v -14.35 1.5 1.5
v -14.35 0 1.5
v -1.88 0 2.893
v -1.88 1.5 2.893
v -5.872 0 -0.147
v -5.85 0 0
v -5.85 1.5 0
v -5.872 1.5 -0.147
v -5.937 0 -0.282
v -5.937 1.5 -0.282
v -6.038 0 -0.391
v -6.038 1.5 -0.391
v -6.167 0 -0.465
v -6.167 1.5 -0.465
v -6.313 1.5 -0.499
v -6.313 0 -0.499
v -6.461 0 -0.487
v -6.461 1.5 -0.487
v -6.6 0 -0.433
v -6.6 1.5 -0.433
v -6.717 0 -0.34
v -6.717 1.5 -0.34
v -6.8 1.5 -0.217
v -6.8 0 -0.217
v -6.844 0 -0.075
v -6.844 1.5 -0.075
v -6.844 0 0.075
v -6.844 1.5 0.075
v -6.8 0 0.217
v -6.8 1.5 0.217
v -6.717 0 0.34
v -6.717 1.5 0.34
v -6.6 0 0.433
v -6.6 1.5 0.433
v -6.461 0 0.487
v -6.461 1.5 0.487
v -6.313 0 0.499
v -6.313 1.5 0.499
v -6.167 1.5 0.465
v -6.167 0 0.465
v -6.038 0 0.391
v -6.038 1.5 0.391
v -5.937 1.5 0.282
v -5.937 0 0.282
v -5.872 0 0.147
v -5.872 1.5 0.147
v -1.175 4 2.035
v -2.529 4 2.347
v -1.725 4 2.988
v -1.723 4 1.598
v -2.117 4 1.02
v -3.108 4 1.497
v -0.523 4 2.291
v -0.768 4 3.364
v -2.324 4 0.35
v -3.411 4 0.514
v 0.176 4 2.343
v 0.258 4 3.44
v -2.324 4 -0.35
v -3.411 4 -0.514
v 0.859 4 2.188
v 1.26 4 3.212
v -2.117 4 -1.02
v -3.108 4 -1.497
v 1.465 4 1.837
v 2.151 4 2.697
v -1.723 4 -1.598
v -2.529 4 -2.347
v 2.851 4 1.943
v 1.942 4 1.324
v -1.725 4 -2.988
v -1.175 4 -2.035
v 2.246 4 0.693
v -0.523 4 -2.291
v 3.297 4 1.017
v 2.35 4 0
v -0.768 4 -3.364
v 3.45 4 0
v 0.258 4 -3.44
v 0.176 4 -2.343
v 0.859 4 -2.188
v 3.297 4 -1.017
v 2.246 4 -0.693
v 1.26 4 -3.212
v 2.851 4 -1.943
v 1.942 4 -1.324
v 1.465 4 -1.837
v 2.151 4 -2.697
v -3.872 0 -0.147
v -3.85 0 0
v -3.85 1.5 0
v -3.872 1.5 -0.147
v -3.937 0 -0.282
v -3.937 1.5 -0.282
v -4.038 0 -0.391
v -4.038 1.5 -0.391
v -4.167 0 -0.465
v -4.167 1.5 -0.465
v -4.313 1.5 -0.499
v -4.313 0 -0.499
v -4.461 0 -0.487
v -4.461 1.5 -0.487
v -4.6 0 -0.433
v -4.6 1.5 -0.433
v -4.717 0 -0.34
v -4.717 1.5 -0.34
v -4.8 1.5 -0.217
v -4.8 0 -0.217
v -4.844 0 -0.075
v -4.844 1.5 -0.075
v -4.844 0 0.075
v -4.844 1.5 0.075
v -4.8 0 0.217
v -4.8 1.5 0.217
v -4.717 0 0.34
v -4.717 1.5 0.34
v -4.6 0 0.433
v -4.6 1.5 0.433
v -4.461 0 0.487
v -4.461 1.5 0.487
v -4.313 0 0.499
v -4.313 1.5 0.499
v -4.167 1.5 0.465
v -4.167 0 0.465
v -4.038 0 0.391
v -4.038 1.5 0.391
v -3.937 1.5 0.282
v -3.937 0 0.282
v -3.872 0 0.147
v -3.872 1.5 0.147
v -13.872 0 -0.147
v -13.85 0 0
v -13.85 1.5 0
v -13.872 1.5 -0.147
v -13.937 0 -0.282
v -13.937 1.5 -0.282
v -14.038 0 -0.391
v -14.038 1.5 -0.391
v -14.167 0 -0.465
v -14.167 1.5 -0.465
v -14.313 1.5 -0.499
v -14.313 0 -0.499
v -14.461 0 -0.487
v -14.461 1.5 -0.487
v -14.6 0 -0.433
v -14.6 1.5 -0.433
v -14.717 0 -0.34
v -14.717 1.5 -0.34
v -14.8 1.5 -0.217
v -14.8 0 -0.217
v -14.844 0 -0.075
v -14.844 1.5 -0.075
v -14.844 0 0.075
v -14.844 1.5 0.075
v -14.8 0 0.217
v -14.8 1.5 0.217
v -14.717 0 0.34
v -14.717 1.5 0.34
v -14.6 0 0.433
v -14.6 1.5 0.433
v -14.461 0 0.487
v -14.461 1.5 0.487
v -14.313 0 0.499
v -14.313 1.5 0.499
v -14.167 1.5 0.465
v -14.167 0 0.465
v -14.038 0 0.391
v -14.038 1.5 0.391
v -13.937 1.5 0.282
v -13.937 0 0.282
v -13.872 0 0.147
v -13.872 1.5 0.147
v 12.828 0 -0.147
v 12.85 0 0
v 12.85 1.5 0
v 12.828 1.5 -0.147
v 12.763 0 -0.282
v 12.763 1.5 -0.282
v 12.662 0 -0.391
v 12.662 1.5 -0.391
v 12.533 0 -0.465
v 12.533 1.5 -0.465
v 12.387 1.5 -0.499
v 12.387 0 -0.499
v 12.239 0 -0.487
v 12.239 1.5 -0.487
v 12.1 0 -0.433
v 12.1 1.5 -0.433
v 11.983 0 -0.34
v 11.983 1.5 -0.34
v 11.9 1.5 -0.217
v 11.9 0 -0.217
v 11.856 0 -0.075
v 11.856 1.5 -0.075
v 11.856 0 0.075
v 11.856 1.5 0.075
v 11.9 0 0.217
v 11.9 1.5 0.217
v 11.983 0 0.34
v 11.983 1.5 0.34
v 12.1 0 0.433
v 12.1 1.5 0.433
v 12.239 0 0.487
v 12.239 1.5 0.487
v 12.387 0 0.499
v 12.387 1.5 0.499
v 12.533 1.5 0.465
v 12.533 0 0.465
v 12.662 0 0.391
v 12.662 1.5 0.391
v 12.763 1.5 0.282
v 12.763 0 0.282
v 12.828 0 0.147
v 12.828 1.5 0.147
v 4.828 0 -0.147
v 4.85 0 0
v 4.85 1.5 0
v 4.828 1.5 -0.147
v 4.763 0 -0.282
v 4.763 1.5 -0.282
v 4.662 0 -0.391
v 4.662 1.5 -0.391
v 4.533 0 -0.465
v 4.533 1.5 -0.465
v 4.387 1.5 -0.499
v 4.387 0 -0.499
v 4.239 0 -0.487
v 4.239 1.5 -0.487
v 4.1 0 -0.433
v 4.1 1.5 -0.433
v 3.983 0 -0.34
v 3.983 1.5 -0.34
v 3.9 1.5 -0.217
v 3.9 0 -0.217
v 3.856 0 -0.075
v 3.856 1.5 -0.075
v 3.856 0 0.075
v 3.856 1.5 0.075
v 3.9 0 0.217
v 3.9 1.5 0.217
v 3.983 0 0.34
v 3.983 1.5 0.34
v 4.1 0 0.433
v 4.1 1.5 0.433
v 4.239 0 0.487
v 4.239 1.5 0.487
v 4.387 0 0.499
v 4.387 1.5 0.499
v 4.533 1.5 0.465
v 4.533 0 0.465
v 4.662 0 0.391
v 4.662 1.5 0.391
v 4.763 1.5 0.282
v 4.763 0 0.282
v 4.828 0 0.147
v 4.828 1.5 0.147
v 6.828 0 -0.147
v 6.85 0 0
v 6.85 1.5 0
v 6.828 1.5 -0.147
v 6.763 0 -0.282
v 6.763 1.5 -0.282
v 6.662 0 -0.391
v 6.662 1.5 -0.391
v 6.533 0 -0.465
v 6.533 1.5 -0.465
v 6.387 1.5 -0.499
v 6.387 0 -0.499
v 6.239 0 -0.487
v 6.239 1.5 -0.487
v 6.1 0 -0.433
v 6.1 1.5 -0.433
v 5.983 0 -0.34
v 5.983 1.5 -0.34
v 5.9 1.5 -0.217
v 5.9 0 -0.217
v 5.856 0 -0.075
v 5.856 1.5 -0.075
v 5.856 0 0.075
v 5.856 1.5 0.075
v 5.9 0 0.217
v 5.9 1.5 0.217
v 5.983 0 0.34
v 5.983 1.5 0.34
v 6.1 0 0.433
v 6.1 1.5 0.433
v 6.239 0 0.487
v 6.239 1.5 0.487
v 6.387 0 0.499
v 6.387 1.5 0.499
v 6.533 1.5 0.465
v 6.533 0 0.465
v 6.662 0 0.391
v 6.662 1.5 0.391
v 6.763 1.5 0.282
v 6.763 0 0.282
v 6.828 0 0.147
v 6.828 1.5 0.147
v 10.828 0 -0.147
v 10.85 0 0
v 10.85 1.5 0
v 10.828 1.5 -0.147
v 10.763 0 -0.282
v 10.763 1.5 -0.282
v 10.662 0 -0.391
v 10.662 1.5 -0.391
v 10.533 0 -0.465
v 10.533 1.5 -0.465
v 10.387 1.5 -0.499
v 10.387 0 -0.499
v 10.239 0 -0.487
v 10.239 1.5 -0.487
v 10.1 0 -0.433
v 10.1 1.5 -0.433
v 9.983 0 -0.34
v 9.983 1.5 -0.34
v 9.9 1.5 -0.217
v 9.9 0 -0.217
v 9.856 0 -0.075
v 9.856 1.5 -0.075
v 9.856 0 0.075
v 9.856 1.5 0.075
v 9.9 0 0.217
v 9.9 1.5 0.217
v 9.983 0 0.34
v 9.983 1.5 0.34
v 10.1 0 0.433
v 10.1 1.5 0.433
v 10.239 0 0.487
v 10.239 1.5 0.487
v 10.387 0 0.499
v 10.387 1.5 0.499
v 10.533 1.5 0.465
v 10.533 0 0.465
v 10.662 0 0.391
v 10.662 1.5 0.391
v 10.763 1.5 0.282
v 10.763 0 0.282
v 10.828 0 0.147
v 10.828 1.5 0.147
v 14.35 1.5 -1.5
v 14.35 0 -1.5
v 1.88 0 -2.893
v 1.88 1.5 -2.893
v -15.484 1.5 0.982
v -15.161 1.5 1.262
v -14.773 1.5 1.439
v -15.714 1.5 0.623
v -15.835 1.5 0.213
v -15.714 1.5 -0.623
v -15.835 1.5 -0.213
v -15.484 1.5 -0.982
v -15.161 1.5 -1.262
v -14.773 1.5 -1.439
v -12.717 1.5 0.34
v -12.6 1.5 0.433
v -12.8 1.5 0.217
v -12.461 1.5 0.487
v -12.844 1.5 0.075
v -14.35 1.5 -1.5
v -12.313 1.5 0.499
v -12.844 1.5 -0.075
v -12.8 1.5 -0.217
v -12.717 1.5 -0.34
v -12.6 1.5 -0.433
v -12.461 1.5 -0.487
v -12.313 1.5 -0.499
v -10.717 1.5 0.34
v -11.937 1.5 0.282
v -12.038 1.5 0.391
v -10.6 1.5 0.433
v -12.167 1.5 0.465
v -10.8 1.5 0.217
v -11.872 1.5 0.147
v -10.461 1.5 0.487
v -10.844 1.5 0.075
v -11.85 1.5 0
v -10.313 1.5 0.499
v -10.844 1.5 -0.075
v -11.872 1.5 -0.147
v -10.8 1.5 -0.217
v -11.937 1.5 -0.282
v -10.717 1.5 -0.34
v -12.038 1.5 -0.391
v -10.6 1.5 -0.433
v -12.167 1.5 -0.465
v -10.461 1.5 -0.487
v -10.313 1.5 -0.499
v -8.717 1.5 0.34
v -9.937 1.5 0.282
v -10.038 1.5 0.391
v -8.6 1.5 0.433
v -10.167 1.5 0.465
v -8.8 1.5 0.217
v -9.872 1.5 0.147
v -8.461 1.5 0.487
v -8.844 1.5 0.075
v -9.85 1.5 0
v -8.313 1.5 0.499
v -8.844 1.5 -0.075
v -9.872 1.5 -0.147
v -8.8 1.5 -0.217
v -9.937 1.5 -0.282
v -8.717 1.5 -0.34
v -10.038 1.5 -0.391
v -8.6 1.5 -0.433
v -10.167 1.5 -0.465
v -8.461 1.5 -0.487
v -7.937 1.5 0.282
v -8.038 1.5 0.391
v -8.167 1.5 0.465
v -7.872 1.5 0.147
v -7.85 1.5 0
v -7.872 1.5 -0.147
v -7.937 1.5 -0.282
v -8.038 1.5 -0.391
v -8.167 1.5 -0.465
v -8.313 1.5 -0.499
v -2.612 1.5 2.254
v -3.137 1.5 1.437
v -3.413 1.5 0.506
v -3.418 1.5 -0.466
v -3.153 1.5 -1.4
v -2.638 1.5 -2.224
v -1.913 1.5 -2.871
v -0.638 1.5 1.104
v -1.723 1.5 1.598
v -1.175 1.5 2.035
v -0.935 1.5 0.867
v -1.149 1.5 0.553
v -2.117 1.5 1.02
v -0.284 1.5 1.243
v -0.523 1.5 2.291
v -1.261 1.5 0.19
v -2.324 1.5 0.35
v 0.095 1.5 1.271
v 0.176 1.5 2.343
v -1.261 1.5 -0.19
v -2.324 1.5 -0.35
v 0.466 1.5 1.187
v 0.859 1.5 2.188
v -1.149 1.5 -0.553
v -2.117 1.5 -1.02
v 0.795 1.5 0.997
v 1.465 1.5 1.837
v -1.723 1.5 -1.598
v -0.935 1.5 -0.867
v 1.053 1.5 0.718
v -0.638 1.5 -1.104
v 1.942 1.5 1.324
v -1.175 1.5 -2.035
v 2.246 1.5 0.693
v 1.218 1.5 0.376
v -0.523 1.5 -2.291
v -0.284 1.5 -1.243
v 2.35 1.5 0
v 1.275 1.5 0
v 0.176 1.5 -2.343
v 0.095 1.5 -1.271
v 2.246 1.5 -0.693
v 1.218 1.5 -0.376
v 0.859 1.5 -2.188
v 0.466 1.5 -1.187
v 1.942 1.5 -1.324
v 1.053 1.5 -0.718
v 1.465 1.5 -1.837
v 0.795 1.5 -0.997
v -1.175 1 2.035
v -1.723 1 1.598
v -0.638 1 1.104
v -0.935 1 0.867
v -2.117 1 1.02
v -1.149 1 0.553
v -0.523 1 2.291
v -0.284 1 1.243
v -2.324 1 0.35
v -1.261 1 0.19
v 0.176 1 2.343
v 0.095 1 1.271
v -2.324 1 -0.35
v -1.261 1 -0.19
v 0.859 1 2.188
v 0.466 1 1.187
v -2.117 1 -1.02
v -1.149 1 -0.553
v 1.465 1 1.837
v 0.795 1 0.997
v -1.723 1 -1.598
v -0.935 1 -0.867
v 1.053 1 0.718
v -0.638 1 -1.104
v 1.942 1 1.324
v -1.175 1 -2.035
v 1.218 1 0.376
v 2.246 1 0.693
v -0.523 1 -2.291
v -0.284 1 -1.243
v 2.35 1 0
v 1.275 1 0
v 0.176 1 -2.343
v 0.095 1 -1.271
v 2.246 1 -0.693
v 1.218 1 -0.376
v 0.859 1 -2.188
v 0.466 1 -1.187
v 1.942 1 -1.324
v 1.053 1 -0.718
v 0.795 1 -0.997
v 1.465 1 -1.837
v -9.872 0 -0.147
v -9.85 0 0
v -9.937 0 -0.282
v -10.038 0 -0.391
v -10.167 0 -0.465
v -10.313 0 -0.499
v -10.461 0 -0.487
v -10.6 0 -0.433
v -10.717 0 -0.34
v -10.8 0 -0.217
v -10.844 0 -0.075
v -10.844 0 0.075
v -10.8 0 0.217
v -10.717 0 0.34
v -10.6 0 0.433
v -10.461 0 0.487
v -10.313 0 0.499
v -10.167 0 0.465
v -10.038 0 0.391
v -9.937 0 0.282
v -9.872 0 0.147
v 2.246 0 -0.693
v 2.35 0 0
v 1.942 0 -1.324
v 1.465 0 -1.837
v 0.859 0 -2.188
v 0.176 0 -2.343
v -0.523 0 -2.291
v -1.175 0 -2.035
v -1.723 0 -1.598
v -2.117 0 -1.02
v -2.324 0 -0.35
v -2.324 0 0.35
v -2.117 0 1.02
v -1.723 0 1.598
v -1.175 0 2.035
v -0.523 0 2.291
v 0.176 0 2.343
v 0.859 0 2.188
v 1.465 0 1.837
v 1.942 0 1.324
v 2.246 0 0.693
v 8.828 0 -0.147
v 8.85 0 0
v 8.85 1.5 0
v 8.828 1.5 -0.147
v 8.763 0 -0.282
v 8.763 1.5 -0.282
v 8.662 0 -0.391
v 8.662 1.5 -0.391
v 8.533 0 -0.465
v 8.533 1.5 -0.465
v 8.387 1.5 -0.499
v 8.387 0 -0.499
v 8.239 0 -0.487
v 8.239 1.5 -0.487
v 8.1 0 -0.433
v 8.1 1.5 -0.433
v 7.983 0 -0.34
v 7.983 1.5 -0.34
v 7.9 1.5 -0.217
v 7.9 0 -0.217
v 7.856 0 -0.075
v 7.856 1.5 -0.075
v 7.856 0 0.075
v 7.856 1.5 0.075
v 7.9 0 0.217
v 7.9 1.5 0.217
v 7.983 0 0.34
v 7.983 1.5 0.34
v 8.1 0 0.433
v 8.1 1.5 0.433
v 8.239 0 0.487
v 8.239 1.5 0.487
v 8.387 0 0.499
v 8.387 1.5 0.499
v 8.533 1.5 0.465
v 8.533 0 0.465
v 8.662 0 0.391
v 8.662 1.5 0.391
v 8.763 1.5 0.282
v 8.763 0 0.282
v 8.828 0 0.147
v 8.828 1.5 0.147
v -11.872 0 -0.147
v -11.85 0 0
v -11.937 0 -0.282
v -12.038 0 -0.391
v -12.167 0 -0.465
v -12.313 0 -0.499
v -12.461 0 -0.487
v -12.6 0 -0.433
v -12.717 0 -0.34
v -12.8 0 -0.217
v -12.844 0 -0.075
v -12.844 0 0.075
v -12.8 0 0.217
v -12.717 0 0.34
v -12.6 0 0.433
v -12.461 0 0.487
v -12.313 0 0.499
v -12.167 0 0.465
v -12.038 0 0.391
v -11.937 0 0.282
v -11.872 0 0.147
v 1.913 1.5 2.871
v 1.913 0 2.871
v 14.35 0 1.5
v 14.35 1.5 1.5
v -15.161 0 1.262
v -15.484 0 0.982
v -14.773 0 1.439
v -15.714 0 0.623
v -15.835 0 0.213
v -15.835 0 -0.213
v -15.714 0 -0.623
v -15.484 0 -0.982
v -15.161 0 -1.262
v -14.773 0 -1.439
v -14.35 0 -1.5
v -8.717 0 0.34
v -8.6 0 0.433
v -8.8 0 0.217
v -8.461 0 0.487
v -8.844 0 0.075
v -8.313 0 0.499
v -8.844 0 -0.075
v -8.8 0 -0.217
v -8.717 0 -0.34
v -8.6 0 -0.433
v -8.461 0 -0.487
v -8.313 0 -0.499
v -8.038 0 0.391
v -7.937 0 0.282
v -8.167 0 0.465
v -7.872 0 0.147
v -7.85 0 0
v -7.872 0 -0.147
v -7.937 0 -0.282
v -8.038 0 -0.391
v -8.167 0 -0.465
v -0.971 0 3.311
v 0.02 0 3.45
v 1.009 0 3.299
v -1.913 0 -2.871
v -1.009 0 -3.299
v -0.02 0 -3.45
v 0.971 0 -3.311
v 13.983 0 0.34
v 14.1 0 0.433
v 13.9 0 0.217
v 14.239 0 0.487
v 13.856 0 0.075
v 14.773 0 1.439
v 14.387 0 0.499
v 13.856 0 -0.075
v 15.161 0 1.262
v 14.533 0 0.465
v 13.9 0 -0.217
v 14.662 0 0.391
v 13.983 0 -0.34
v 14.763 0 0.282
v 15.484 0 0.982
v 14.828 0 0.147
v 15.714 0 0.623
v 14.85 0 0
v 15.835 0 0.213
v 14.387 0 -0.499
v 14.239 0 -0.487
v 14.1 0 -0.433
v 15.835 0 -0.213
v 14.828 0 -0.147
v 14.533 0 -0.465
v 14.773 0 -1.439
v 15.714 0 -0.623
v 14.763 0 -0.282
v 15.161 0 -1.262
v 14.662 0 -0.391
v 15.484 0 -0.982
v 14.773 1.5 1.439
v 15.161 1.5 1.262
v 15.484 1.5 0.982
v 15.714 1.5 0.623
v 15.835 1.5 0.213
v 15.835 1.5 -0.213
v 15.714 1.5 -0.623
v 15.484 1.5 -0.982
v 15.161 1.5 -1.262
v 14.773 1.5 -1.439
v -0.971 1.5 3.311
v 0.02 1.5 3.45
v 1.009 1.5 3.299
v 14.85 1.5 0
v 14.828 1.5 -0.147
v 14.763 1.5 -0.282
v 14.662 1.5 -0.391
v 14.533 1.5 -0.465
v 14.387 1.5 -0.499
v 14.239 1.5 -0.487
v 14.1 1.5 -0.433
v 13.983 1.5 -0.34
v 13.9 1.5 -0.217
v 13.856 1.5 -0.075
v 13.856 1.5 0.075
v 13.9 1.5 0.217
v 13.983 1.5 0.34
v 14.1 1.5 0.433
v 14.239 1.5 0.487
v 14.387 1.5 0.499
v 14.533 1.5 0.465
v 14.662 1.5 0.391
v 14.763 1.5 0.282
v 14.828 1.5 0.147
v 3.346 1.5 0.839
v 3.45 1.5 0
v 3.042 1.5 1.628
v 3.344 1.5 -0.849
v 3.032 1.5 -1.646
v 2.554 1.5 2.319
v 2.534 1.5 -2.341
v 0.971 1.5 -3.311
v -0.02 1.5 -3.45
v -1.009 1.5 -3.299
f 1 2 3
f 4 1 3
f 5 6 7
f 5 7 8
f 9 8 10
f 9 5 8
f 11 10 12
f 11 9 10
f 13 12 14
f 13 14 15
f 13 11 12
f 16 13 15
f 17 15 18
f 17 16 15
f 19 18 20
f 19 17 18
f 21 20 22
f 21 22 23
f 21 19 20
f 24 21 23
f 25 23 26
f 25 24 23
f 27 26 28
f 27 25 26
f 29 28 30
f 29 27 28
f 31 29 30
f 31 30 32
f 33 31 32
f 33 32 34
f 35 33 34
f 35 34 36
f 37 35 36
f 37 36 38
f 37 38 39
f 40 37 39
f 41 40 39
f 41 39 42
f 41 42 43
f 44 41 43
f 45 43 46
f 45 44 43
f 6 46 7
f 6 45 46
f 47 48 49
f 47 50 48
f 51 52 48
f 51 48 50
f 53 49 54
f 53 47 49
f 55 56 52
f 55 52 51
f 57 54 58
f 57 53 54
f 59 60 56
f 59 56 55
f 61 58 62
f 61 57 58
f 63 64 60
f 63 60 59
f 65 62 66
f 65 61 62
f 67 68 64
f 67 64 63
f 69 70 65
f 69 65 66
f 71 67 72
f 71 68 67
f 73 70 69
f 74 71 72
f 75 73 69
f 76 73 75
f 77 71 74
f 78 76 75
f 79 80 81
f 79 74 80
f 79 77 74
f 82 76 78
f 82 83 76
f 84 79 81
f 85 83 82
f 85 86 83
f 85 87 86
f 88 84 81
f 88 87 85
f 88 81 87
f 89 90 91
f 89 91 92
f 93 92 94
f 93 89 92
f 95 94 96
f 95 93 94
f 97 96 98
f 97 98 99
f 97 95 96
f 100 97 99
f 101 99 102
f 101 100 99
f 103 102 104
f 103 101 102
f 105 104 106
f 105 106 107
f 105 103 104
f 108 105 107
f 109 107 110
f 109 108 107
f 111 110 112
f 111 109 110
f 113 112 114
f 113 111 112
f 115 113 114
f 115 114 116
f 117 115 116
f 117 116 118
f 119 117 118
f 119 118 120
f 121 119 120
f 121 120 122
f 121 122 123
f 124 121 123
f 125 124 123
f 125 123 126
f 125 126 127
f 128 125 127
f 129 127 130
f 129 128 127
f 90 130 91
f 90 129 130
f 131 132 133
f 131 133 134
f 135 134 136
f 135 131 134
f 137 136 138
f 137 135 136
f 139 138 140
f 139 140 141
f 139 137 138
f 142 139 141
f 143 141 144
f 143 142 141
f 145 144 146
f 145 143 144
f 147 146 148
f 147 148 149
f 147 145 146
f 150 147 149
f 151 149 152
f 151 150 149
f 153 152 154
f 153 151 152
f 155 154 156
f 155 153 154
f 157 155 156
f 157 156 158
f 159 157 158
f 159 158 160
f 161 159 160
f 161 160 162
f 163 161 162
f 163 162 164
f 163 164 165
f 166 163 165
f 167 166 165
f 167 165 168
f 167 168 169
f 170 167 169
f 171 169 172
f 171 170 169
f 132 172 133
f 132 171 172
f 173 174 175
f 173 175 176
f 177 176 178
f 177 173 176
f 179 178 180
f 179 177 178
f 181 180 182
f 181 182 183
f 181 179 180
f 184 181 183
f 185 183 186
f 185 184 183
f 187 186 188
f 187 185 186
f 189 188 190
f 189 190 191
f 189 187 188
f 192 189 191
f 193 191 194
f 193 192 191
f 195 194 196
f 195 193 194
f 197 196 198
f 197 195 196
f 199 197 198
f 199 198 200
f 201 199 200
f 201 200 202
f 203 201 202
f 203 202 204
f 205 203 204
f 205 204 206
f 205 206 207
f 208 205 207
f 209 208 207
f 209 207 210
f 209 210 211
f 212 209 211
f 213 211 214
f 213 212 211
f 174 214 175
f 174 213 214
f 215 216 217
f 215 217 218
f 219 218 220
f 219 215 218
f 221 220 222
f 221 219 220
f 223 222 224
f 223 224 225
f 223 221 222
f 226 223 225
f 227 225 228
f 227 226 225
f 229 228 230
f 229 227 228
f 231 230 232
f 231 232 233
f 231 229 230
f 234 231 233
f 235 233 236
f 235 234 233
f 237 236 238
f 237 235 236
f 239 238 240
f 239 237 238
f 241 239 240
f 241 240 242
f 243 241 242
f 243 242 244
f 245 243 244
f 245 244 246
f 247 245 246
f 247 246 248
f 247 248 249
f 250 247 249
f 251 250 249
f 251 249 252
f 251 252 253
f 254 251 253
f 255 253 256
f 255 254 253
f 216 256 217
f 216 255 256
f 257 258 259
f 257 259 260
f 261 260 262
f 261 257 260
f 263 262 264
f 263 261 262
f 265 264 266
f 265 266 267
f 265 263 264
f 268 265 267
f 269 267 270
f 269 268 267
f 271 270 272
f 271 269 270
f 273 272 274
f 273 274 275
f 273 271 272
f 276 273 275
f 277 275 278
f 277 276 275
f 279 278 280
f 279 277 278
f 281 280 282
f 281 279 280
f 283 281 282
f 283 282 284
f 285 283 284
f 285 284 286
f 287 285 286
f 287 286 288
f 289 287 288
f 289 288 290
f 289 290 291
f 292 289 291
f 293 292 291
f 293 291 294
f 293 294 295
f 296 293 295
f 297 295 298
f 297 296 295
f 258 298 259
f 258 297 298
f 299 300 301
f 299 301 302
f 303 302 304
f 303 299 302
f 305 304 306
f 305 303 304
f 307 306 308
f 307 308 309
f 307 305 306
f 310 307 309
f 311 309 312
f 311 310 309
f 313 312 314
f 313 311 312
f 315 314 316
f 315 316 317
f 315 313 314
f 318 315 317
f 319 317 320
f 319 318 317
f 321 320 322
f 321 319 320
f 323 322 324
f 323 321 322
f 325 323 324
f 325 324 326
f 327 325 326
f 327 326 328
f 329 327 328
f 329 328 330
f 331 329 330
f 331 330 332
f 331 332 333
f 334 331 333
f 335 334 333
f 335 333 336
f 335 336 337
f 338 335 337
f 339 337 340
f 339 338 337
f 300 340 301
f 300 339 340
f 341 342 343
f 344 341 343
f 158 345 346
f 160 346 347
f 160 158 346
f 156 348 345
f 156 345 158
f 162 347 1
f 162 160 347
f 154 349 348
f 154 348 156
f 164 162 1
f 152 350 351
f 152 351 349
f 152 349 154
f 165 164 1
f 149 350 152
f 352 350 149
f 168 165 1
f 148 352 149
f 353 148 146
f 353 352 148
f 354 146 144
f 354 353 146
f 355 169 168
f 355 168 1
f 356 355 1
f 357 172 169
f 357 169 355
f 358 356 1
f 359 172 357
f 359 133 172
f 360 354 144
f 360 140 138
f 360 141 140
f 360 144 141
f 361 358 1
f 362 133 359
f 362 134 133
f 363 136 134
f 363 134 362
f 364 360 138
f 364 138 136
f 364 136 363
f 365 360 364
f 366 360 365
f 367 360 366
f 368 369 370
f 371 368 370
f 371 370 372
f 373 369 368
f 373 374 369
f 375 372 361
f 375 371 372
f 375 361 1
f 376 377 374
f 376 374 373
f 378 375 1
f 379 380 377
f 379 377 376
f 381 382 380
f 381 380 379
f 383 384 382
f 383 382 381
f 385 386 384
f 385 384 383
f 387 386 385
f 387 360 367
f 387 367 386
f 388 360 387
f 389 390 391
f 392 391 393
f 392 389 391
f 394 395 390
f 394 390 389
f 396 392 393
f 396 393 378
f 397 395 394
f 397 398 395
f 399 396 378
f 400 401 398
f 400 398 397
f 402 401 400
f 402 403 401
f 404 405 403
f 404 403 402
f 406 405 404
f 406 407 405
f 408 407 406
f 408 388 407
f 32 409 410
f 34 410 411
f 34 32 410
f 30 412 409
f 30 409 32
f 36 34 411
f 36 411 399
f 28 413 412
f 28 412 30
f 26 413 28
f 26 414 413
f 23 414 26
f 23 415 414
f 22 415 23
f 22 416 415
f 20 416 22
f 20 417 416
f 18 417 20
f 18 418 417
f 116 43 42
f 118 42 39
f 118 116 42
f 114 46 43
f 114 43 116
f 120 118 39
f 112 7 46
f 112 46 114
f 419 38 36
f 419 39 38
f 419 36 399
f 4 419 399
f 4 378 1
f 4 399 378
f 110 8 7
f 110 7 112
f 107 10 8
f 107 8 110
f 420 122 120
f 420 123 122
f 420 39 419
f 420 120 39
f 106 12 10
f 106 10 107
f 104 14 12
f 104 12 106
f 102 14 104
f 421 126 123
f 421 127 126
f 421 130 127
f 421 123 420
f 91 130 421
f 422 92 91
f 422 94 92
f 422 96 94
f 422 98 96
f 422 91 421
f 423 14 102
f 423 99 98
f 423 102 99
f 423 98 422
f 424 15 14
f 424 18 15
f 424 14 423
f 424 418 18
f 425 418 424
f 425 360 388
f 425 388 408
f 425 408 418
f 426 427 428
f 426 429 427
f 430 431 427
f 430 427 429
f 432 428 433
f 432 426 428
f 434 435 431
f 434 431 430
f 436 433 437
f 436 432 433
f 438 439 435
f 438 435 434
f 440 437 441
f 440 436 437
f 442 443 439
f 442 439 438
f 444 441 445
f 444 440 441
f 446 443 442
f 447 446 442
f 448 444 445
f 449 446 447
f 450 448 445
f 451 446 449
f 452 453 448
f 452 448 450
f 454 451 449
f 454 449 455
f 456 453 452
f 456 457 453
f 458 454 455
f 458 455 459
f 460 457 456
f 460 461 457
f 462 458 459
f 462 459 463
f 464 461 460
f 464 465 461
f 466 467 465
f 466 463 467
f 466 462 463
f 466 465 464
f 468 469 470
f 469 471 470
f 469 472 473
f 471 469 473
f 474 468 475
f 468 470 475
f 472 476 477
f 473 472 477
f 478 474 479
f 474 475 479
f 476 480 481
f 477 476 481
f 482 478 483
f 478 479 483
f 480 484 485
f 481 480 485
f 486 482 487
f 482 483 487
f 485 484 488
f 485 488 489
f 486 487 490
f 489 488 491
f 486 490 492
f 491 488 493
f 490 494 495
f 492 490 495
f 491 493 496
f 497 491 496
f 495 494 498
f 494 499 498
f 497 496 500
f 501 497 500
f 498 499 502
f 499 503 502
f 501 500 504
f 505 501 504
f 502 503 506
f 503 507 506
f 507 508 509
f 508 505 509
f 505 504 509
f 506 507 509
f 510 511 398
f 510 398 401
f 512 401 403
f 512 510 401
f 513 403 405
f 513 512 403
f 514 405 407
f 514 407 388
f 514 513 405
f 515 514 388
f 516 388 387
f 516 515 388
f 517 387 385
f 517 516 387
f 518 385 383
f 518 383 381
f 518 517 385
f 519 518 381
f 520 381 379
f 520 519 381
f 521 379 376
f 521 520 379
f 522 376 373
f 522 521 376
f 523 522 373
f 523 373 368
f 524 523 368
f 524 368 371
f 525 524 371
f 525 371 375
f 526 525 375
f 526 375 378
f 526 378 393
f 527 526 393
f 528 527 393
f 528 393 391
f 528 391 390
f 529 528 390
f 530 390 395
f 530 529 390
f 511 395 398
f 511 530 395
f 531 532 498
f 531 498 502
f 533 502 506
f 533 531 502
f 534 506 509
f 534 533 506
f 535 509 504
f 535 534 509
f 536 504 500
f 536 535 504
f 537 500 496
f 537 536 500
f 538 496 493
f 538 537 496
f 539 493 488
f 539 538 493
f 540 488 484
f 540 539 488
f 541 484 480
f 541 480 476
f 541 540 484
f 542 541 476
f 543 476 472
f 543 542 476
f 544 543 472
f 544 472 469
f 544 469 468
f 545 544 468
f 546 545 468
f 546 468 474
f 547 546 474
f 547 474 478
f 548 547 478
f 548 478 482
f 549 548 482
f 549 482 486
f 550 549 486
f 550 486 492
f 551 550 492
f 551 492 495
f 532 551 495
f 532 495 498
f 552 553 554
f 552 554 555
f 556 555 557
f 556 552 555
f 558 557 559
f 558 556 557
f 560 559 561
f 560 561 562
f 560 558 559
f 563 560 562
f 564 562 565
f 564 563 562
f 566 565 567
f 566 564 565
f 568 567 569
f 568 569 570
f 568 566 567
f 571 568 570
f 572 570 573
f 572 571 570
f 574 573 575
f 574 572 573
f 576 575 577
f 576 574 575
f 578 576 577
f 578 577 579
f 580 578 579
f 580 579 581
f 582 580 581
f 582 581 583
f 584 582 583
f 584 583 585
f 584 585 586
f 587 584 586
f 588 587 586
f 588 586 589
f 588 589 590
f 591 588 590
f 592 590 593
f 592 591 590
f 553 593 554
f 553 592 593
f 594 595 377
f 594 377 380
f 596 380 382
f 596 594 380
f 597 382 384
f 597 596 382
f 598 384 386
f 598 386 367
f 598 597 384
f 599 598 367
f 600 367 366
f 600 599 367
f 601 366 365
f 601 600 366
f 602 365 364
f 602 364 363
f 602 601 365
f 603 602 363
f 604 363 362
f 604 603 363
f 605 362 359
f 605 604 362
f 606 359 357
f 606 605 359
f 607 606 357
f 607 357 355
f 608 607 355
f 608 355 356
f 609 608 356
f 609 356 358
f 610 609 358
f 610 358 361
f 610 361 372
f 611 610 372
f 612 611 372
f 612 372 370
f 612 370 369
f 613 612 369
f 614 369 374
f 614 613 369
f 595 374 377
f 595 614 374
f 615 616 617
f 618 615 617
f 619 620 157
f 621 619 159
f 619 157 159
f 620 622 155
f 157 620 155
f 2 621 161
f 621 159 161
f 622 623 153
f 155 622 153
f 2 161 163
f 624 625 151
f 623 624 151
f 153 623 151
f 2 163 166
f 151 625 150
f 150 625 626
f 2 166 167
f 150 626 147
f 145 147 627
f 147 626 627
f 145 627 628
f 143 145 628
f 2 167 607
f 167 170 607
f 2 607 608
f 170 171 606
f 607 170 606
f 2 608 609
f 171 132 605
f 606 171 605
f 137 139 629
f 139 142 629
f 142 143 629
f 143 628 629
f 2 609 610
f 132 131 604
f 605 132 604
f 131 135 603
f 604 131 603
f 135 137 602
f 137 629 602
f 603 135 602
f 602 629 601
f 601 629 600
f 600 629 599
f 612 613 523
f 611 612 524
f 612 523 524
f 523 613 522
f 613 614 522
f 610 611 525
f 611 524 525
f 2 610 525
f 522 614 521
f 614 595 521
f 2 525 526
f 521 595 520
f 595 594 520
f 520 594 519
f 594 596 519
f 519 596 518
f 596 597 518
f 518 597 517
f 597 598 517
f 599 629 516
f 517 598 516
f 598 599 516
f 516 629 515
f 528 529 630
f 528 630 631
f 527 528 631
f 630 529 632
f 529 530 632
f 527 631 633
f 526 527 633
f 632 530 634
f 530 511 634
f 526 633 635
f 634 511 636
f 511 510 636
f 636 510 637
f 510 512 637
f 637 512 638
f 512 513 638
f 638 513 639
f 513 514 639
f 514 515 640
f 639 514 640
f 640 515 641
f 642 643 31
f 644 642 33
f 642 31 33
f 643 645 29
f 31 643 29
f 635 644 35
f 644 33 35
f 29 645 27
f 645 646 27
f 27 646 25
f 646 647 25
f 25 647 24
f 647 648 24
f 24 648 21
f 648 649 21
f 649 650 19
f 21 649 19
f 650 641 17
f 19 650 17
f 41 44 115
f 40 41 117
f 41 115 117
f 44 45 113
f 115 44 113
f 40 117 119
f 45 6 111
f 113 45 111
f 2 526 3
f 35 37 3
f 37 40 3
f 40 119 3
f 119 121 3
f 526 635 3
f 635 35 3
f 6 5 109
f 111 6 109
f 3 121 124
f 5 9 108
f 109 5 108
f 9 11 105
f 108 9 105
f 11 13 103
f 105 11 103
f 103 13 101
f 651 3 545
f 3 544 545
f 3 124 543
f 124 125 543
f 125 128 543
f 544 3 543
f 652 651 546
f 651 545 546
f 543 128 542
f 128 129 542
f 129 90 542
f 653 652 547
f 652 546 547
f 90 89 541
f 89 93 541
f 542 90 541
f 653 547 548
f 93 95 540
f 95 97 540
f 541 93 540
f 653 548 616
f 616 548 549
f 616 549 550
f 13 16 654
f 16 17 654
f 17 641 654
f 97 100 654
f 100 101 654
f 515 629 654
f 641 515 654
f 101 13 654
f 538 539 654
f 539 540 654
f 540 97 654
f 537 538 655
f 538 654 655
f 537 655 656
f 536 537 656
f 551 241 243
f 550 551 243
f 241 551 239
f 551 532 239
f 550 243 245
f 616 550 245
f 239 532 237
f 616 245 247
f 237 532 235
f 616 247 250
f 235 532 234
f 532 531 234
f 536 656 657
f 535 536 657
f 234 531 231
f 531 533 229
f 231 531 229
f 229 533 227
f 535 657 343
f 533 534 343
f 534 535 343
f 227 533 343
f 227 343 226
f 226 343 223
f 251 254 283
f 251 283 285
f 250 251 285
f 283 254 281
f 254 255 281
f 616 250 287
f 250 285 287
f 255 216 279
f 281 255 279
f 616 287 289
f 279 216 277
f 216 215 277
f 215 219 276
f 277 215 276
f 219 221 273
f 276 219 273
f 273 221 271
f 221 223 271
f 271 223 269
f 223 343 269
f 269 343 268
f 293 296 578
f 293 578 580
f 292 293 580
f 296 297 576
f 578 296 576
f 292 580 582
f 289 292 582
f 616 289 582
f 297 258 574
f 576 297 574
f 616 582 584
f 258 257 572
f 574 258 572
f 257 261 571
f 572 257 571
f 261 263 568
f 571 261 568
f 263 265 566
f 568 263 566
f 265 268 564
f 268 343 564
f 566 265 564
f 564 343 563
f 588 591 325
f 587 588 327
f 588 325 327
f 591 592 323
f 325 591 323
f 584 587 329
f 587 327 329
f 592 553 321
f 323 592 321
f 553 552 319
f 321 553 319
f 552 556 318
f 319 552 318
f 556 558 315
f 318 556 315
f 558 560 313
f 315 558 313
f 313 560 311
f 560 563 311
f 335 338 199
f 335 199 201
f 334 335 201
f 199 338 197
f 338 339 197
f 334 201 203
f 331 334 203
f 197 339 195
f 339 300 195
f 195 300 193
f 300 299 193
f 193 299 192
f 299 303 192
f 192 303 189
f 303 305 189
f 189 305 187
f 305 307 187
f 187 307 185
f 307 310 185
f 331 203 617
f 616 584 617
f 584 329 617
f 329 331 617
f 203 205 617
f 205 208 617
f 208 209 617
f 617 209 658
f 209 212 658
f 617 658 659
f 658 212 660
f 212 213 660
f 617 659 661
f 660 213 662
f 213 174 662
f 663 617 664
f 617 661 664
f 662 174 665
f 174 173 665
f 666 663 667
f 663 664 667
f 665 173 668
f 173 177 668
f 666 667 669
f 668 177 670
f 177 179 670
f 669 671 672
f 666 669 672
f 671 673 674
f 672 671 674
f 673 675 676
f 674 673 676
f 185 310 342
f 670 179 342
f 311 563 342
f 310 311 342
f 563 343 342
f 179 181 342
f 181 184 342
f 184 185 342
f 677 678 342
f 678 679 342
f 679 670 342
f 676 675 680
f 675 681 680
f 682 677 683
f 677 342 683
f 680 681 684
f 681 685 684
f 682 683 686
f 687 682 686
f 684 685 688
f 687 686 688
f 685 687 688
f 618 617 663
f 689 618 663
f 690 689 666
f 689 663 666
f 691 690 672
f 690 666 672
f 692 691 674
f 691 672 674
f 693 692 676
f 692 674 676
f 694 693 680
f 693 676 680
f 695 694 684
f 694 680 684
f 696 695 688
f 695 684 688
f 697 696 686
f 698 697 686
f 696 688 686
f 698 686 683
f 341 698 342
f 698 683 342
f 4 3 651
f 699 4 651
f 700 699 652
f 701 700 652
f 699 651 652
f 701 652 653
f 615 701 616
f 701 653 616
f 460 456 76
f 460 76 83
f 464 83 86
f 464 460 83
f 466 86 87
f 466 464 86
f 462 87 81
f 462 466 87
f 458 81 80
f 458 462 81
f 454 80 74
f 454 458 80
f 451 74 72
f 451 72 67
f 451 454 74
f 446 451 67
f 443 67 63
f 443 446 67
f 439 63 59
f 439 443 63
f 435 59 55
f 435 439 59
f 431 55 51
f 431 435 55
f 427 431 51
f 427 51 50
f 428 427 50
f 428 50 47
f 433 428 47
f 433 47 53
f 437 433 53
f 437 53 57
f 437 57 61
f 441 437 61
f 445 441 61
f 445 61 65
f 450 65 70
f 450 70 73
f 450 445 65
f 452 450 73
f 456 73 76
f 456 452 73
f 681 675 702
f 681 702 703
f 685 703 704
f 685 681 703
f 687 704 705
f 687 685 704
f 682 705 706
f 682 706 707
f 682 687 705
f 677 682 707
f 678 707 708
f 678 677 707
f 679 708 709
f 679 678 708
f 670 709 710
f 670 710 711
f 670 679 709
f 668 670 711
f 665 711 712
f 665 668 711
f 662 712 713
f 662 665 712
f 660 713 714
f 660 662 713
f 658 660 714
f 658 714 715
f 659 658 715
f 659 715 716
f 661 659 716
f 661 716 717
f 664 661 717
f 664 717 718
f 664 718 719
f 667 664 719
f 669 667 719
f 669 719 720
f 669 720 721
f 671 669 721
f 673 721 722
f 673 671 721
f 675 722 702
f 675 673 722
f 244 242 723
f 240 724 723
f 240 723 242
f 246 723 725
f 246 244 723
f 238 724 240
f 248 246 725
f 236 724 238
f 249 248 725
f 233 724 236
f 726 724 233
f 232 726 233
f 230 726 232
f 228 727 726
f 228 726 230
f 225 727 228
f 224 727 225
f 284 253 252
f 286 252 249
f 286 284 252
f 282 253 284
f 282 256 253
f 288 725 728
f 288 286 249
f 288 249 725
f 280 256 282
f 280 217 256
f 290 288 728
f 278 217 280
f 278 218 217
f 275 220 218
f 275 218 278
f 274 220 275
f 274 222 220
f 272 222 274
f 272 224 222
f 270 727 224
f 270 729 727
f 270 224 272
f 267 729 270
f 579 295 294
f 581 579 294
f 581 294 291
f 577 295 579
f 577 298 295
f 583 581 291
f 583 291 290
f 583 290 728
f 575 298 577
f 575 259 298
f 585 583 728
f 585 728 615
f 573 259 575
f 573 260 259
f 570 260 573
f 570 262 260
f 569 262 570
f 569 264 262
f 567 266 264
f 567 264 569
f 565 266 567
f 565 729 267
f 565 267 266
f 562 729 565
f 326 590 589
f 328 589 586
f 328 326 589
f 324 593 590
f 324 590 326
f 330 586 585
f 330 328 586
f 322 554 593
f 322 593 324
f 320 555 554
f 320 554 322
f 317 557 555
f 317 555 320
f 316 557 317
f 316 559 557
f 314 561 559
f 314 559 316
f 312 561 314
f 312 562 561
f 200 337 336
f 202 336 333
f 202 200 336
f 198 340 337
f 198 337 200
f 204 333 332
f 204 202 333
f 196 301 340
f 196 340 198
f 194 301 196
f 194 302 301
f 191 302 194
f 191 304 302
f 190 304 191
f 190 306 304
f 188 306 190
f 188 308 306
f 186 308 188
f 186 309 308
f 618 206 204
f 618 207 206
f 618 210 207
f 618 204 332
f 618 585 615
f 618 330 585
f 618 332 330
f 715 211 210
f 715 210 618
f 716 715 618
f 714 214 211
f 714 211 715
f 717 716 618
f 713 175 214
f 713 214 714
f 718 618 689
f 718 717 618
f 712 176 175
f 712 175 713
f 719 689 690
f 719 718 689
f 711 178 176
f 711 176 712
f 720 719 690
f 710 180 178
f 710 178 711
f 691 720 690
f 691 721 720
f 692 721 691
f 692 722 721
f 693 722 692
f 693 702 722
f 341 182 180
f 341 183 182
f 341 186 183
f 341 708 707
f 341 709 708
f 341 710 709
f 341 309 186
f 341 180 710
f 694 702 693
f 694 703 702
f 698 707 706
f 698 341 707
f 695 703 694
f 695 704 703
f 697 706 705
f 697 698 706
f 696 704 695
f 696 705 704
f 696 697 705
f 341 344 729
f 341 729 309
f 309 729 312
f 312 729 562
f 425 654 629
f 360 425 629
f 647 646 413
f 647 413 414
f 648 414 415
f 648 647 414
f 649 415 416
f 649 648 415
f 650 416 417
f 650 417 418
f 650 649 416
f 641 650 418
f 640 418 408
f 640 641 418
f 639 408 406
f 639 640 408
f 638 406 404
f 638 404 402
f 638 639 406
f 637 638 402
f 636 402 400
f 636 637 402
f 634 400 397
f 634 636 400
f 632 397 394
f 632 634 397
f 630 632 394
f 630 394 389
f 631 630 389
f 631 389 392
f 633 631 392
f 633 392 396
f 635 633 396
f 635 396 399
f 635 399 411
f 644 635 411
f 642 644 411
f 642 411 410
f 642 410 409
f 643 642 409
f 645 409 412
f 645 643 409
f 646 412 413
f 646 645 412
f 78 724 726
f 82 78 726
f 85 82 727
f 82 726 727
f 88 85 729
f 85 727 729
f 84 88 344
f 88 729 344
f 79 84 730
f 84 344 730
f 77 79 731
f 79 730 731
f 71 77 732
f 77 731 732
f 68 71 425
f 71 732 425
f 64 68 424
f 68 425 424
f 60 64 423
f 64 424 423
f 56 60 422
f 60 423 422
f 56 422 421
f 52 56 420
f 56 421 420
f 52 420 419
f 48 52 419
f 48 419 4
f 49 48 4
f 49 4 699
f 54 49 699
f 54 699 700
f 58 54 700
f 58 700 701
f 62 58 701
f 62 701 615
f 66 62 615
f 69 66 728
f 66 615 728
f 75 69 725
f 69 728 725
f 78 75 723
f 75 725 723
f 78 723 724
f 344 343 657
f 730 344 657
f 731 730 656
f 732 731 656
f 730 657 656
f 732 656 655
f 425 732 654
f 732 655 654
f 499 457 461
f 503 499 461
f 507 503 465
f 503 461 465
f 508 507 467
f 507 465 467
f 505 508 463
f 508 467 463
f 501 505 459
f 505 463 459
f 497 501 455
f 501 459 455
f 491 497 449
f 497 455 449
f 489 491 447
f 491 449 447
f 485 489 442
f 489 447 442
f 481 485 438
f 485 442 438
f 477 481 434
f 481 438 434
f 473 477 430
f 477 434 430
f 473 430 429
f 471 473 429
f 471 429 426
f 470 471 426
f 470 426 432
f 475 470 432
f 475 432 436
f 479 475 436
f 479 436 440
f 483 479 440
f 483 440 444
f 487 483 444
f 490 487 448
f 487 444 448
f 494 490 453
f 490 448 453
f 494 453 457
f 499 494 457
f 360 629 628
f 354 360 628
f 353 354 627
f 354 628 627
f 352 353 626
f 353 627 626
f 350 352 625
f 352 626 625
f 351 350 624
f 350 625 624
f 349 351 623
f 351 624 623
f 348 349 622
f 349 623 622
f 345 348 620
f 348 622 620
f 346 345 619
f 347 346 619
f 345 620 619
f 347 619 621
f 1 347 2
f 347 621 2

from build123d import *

# Parameters (mm, degrees)
SKETCH2_R           = 2.35
SKETCH2_R_2         = 1.275
BOSS_EXTRUDE3_DEPTH = 0.5
SKETCH2_7_R         = 3.45
SKETCH2_7_R_2       = 2.35
BOSS_EXTRUDE5_DEPTH = 2.5
BOSS_EXTRUDE6_START = 1.5
SKETCH1_R           = 2.35
SKETCH1_R_2         = 0.5
BOSS_EXTRUDE6_DEPTH = 1.5


with BuildPart() as part:
    # Sketch2 → Boss-Extrude3 (new body)
    with BuildSketch(Plane(origin=(0, 1.5, 0), x_dir=(1, 0, 0), z_dir=(0, 1, 0))):
        Circle(SKETCH2_R)
        Circle(SKETCH2_R_2, mode=Mode.SUBTRACT)
    extrude(amount=-BOSS_EXTRUDE3_DEPTH)



with BuildPart() as body_2:
    # Sketch2<7> → Boss-Extrude5 (new body)
    with BuildSketch(Plane(origin=(0, 1.5, 0), x_dir=(1, 0, 0), z_dir=(0, 1, 0))):
        Circle(SKETCH2_7_R)
        Circle(SKETCH2_7_R_2, mode=Mode.SUBTRACT)
    extrude(amount=BOSS_EXTRUDE5_DEPTH)


with BuildPart() as part_1:
    add(part.part)

    add(body_2.part)  # Boss-Extrude6 merges body 2
    # Sketch1 → Boss-Extrude6 (add)
    with BuildSketch(Plane(origin=(0, 0, 0), x_dir=(1, 0, 0), z_dir=(0, 1, 0)).offset(BOSS_EXTRUDE6_START)):
        with BuildLine():
            Line((14.35, 1.5), (1.879742768, 2.892933999))
            ThreePointArc((1.879742768, 2.892933999), (-0.020024107, 3.449941889), (-1.913197247, 2.870919068))
            Line((-1.913197247, 2.870919068), (-14.35, 1.5))
            ThreePointArc((-14.35, 1.5), (-15.85, 0), (-14.35, -1.5))
            Line((-14.35, -1.5), (-1.879742768, -2.892933999))
            ThreePointArc((-1.879742768, -2.892933999), (0.020024107, -3.449941889), (1.913197247, -2.870919068))
            Line((1.913197247, -2.870919068), (14.35, -1.5))
            ThreePointArc((14.35, -1.5), (15.85, 0), (14.35, 1.5))
        make_face()
        Circle(SKETCH1_R, mode=Mode.SUBTRACT)
        with Locations((12.35, 0)):
            Circle(SKETCH1_R_2, mode=Mode.SUBTRACT)
        with Locations((14.35, 0)):
            Circle(SKETCH1_R_2, mode=Mode.SUBTRACT)
        with Locations((10.35, 0)):
            Circle(SKETCH1_R_2, mode=Mode.SUBTRACT)
        with Locations((8.35, 0)):
            Circle(SKETCH1_R_2, mode=Mode.SUBTRACT)
        with Locations((6.35, 0)):
            Circle(SKETCH1_R_2, mode=Mode.SUBTRACT)
        with Locations((4.35, 0)):
            Circle(SKETCH1_R_2, mode=Mode.SUBTRACT)
        with Locations((-12.35, 0)):
            Circle(SKETCH1_R_2, mode=Mode.SUBTRACT)
        with Locations((-14.35, 0)):
            Circle(SKETCH1_R_2, mode=Mode.SUBTRACT)
        with Locations((-10.35, 0)):
            Circle(SKETCH1_R_2, mode=Mode.SUBTRACT)
        with Locations((-8.35, 0)):
            Circle(SKETCH1_R_2, mode=Mode.SUBTRACT)
        with Locations((-6.35, 0)):
            Circle(SKETCH1_R_2, mode=Mode.SUBTRACT)
        with Locations((-4.35, 0)):
            Circle(SKETCH1_R_2, mode=Mode.SUBTRACT)
    extrude(amount=-BOSS_EXTRUDE6_DEPTH)


solid = part_1.part
